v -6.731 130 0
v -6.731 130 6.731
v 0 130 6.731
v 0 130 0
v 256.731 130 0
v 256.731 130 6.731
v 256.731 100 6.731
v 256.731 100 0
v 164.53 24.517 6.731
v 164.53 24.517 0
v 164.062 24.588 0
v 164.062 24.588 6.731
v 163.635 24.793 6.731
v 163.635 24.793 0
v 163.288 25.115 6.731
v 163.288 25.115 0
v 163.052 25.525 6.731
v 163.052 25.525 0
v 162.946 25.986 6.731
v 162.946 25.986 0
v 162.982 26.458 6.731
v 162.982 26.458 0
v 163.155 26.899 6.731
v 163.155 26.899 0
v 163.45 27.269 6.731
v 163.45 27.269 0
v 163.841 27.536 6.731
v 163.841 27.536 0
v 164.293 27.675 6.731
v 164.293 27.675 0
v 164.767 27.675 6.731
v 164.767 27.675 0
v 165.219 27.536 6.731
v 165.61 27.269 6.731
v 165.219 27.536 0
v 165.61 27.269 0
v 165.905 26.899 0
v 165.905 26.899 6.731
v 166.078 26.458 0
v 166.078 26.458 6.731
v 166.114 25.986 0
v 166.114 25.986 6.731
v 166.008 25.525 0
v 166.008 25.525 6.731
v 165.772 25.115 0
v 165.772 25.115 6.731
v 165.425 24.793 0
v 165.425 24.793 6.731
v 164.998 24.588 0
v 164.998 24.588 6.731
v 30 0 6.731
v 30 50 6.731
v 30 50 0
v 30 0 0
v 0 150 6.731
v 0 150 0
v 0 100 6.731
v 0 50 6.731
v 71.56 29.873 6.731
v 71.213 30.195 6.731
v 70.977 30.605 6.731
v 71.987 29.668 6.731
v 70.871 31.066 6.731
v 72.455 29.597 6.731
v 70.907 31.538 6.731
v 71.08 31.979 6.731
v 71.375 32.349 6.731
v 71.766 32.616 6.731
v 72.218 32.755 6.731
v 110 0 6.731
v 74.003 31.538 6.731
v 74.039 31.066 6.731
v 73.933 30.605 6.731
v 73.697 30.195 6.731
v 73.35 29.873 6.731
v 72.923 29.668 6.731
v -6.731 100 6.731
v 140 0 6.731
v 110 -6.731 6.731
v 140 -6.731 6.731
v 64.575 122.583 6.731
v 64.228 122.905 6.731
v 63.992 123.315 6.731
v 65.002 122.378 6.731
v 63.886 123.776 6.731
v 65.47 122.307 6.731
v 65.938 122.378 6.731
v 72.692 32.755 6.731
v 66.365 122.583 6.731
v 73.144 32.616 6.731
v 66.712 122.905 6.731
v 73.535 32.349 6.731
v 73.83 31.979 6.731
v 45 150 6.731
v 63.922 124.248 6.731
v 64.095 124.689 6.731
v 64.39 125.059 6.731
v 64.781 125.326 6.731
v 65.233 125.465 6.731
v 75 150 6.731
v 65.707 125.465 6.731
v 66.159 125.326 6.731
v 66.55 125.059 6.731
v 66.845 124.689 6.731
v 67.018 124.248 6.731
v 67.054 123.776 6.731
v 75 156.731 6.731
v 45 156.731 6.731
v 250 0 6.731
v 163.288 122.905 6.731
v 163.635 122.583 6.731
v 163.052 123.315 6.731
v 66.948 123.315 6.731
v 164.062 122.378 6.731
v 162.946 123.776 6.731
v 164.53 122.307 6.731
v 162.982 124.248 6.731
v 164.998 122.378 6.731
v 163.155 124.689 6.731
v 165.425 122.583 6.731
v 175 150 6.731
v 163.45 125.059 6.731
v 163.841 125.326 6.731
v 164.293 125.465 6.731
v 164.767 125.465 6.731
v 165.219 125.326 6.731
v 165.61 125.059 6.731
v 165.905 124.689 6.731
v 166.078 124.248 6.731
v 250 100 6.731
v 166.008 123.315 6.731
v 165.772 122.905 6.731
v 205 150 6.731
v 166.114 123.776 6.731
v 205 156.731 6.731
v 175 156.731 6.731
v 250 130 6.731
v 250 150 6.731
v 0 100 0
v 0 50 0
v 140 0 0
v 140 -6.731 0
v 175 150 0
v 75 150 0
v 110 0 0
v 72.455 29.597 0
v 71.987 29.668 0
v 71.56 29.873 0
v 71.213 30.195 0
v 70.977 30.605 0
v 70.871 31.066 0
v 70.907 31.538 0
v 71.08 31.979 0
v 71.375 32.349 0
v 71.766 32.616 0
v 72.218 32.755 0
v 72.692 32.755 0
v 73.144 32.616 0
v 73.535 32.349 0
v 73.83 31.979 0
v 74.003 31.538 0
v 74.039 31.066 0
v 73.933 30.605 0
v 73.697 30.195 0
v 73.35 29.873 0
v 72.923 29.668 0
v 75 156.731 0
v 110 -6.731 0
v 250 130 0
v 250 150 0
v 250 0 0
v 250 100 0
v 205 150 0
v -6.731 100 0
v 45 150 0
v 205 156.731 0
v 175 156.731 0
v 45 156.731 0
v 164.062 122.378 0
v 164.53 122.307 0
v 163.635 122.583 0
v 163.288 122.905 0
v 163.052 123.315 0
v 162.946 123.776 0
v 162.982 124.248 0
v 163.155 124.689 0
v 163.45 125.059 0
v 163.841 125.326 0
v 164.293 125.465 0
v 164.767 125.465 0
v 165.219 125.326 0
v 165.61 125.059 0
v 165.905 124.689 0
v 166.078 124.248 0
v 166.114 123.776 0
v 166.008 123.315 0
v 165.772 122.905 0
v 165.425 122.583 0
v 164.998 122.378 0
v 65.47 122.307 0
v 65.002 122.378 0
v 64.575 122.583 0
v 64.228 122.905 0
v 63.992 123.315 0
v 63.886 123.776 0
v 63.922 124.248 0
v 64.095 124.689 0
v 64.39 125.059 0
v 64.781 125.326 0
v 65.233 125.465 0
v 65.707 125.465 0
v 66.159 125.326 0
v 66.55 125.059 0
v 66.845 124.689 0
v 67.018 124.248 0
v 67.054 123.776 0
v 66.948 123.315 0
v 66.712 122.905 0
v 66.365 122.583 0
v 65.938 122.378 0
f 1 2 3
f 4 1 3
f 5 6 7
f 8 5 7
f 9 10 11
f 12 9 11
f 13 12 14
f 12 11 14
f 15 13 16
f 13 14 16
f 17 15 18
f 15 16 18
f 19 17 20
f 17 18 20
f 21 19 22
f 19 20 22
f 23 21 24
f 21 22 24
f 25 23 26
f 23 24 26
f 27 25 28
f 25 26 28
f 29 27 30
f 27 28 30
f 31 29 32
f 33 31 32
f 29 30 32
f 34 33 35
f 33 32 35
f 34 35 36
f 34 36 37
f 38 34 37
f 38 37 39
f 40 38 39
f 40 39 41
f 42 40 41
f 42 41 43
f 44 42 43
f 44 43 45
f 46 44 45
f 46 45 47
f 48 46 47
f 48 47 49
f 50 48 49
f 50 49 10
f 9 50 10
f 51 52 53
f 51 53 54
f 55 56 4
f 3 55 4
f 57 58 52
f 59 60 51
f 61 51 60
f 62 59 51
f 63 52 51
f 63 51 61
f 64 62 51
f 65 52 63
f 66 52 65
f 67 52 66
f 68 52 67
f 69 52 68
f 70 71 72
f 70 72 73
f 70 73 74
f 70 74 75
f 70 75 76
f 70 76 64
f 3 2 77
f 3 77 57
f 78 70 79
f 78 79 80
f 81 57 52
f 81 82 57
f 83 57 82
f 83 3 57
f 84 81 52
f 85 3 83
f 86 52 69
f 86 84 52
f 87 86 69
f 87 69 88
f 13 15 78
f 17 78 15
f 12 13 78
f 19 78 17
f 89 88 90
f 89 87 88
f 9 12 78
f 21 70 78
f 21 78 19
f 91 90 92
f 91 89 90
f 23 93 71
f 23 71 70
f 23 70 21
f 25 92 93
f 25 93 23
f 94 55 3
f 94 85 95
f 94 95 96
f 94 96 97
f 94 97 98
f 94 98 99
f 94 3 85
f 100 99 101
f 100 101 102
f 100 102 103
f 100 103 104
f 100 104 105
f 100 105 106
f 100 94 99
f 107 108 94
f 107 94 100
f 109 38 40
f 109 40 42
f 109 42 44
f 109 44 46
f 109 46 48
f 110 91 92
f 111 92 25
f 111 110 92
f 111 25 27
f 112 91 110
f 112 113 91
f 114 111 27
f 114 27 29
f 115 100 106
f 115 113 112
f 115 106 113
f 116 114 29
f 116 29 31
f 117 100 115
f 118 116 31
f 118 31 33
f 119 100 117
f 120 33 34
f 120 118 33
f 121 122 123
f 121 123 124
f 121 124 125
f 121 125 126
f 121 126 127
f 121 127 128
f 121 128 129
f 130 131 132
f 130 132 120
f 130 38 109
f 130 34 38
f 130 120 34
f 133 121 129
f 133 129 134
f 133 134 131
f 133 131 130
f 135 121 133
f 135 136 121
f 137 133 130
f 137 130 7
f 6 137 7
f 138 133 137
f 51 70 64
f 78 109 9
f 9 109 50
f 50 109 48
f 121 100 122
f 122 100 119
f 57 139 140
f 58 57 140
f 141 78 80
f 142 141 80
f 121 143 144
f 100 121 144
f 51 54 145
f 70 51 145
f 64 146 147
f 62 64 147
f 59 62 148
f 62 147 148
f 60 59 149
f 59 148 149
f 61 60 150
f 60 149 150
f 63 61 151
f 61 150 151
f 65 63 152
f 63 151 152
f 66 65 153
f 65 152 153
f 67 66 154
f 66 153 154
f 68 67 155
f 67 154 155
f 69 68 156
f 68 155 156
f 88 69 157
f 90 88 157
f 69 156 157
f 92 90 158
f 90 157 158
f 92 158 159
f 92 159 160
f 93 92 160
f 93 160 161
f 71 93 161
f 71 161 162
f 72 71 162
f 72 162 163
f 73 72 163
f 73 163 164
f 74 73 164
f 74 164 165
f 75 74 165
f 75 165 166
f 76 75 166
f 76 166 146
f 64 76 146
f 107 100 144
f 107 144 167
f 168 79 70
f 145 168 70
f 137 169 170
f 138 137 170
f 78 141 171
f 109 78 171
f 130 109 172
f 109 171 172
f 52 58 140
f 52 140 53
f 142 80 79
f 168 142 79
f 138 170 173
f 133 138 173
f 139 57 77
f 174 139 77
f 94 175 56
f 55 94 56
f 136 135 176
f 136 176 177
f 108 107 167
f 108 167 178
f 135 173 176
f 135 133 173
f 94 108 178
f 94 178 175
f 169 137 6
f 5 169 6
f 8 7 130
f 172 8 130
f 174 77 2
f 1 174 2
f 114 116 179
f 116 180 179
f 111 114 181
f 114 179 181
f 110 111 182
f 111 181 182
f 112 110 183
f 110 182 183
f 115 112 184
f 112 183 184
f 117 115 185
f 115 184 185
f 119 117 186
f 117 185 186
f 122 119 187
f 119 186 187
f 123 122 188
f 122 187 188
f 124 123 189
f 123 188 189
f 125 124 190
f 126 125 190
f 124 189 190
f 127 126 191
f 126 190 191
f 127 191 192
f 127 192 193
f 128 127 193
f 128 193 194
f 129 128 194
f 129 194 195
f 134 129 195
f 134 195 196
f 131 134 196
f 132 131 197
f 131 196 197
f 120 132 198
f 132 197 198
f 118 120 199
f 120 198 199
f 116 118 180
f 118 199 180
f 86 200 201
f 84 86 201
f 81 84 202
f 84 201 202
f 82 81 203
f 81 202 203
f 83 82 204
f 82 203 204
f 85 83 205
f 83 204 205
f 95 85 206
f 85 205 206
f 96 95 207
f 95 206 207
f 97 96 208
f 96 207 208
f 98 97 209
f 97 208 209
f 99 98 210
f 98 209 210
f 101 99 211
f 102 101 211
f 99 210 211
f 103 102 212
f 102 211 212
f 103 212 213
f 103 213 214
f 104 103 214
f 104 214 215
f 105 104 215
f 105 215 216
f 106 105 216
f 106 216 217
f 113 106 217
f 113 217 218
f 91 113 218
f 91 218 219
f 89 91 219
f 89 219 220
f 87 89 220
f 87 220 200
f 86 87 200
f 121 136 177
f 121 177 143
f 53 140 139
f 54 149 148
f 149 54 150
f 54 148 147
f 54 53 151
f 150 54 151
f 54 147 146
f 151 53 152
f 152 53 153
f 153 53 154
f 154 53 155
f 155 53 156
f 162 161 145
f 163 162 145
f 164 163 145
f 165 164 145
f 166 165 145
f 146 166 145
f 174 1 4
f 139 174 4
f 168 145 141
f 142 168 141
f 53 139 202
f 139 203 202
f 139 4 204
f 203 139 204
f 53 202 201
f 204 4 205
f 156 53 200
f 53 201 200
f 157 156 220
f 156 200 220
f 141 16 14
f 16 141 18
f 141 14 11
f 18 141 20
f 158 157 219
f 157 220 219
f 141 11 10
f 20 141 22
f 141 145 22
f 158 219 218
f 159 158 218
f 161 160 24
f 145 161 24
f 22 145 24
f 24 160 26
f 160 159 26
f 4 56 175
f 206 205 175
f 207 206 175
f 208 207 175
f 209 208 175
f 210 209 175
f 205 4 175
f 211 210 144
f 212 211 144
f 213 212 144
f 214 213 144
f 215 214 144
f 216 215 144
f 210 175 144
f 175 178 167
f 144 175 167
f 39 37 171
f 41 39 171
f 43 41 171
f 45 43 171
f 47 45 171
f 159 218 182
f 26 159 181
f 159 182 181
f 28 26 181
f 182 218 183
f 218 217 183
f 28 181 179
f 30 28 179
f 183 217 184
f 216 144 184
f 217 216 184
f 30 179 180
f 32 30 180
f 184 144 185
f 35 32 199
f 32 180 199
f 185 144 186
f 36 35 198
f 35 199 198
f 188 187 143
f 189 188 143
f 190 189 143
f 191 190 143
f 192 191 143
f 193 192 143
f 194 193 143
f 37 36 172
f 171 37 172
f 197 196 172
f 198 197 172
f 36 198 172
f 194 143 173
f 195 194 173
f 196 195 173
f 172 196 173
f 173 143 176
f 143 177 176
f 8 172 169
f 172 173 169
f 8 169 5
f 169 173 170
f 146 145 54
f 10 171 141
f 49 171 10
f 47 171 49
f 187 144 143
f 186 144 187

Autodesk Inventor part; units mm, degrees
ref_plane "YZ Plane" through (0, 0, 0) normal (1, 0, 0) x (0, 1, 0)
ref_plane "XZ Plane" through (0, 0, 0) normal (0, 1, 0) x (-1, 0, 0)
ref_plane "XY Plane" through (0, 0, 0) normal (0, 0, 1) x (1, 0, 0)
sketch "Sketch1" plane through (0, 0, 0) normal (0, 0, 1) x (1, 0, 0)
  line L0 (0, 0) -> (250, 0)
  line L1 (250, 0) -> (250, 150)
  line L2 (250, 150) -> (0, 150)
  line L3 (0, 150) -> (0, 0)
  dimension "d0" = 150
  dimension "d1" = 250
extrude "Extrusion1" add sketch "Sketch1" along normal blind 6.731
sketch "Sketch2" plane through (0, 0, 6.731) normal (0, 0, 1) x (1, 0, 0)
  line L0 (0, 0) -> (250, 0) projected
  line L1 (250, 0) -> (250, 150) projected
  line L2 (250, 150) -> (0, 150) projected
  line L3 (0, 150) -> (0, 0) projected
  point P0 (72.455, 31.185)
  point P1 (65.47, 123.895)
  point P2 (164.53, 123.895)
  point P3 (164.53, 26.105)
  dimension "d4" = 92.075
  dimension "d5" = 5.08
  dimension "d6" = 92.71
  dimension "d7" = 6.985
  dimension "d8" = 26.105
  dimension "d9" = 26.105
  dimension "d10" = 65.47
  dimension "d11" = 85.47
hole "Hole1" at (72.455, 31.185, 6.731) at (65.47, 123.895, 6.731) at (164.53, 123.895, 6.731) at (164.53, 26.105, 6.731) direction (0, 0, -1) diameter 3.176 end through all
sketch "Sketch3" plane through (0, 0, 6.731) normal (0, 0, 1) x (1, 0, 0)
  line L0 (0, 0) -> (250, 0) projected
  line L1 (250, 0) -> (250, 150) projected
  line L2 (0, 150) -> (0, 0) projected
  line L3 (0, 100) -> (-6.731, 100)
  line L4 (-6.731, 100) -> (-6.731, 130)
  line L5 (-6.731, 130) -> (0, 130)
  line L6 (0, 130) -> (0, 100)
  line L7 (250, 130) -> (256.731, 130)
  line L8 (256.731, 130) -> (256.731, 100)
  line L9 (256.731, 100) -> (250, 100)
  line L10 (250, 100) -> (250, 130)
  line L11 (110, 0) -> (140, 0)
  line L12 (140, 0) -> (140, -6.731)
  line L13 (140, -6.731) -> (110, -6.731)
  line L14 (110, -6.731) -> (110, 0)
  line L15 (250, 150) -> (0, 150) projected
  line L16 (45, 150) -> (75, 150)
  line L17 (75, 150) -> (75, 156.731)
  line L18 (75, 156.731) -> (45, 156.731)
  line L19 (45, 156.731) -> (45, 150)
  line L20 (175, 150) -> (205, 150)
  line L21 (205, 150) -> (205, 156.731)
  line L22 (205, 156.731) -> (175, 156.731)
  line L23 (175, 156.731) -> (175, 150)
  line L24 (75, 156.731) -> (175, 156.731) construction
  point P0 (125, 0)
  point P1 (125, 0)
  point P2 (125, 156.731)
  point P3 (125, 150)
  dimension "d19" = 6.731
  dimension "d20" = 30
  dimension "d21" = 100
  dimension "d24" = 100
extrude "Extrusion2" add sketch "Sketch3" against normal up to surface (6.731 mm away) contours L0 L12 L13 L14 | L3 L4 L5 L2 | L1 L7 L8 L9 | L19 L18 L17 L15 | L23 L22 L21 L15
sketch "Sketch4" plane through (0, 0, 6.731) normal (0, 0, 1) x (1, 0, 0)
  line L0 (0, 0) -> (110, 0) projected
  line L1 (0, 100) -> (0, 0) projected
  line L2 (0, 50) -> (30, 50)
  line L3 (30, 50) -> (30, 0)
  dimension "d25" = 50
  dimension "d26" = 30
extrude "Extrusion3" cut sketch "Sketch4" against normal up to next
equation "\"d2\" = THICKB"
equation "\"d8\" = d9"
equation "\"d19\" = THICKB"
equation "\"THICKA\" = 3.175"
equation "\"THICKB\" = 6.731"
equation "\"THICKC\" = 12.7"
equation "\"THICKPLY\" = 5"
equation "\"MAGDIA\" = 9.5"
equation "\"BALLDIA\" = 12"
properties part number "Center_Mount"
